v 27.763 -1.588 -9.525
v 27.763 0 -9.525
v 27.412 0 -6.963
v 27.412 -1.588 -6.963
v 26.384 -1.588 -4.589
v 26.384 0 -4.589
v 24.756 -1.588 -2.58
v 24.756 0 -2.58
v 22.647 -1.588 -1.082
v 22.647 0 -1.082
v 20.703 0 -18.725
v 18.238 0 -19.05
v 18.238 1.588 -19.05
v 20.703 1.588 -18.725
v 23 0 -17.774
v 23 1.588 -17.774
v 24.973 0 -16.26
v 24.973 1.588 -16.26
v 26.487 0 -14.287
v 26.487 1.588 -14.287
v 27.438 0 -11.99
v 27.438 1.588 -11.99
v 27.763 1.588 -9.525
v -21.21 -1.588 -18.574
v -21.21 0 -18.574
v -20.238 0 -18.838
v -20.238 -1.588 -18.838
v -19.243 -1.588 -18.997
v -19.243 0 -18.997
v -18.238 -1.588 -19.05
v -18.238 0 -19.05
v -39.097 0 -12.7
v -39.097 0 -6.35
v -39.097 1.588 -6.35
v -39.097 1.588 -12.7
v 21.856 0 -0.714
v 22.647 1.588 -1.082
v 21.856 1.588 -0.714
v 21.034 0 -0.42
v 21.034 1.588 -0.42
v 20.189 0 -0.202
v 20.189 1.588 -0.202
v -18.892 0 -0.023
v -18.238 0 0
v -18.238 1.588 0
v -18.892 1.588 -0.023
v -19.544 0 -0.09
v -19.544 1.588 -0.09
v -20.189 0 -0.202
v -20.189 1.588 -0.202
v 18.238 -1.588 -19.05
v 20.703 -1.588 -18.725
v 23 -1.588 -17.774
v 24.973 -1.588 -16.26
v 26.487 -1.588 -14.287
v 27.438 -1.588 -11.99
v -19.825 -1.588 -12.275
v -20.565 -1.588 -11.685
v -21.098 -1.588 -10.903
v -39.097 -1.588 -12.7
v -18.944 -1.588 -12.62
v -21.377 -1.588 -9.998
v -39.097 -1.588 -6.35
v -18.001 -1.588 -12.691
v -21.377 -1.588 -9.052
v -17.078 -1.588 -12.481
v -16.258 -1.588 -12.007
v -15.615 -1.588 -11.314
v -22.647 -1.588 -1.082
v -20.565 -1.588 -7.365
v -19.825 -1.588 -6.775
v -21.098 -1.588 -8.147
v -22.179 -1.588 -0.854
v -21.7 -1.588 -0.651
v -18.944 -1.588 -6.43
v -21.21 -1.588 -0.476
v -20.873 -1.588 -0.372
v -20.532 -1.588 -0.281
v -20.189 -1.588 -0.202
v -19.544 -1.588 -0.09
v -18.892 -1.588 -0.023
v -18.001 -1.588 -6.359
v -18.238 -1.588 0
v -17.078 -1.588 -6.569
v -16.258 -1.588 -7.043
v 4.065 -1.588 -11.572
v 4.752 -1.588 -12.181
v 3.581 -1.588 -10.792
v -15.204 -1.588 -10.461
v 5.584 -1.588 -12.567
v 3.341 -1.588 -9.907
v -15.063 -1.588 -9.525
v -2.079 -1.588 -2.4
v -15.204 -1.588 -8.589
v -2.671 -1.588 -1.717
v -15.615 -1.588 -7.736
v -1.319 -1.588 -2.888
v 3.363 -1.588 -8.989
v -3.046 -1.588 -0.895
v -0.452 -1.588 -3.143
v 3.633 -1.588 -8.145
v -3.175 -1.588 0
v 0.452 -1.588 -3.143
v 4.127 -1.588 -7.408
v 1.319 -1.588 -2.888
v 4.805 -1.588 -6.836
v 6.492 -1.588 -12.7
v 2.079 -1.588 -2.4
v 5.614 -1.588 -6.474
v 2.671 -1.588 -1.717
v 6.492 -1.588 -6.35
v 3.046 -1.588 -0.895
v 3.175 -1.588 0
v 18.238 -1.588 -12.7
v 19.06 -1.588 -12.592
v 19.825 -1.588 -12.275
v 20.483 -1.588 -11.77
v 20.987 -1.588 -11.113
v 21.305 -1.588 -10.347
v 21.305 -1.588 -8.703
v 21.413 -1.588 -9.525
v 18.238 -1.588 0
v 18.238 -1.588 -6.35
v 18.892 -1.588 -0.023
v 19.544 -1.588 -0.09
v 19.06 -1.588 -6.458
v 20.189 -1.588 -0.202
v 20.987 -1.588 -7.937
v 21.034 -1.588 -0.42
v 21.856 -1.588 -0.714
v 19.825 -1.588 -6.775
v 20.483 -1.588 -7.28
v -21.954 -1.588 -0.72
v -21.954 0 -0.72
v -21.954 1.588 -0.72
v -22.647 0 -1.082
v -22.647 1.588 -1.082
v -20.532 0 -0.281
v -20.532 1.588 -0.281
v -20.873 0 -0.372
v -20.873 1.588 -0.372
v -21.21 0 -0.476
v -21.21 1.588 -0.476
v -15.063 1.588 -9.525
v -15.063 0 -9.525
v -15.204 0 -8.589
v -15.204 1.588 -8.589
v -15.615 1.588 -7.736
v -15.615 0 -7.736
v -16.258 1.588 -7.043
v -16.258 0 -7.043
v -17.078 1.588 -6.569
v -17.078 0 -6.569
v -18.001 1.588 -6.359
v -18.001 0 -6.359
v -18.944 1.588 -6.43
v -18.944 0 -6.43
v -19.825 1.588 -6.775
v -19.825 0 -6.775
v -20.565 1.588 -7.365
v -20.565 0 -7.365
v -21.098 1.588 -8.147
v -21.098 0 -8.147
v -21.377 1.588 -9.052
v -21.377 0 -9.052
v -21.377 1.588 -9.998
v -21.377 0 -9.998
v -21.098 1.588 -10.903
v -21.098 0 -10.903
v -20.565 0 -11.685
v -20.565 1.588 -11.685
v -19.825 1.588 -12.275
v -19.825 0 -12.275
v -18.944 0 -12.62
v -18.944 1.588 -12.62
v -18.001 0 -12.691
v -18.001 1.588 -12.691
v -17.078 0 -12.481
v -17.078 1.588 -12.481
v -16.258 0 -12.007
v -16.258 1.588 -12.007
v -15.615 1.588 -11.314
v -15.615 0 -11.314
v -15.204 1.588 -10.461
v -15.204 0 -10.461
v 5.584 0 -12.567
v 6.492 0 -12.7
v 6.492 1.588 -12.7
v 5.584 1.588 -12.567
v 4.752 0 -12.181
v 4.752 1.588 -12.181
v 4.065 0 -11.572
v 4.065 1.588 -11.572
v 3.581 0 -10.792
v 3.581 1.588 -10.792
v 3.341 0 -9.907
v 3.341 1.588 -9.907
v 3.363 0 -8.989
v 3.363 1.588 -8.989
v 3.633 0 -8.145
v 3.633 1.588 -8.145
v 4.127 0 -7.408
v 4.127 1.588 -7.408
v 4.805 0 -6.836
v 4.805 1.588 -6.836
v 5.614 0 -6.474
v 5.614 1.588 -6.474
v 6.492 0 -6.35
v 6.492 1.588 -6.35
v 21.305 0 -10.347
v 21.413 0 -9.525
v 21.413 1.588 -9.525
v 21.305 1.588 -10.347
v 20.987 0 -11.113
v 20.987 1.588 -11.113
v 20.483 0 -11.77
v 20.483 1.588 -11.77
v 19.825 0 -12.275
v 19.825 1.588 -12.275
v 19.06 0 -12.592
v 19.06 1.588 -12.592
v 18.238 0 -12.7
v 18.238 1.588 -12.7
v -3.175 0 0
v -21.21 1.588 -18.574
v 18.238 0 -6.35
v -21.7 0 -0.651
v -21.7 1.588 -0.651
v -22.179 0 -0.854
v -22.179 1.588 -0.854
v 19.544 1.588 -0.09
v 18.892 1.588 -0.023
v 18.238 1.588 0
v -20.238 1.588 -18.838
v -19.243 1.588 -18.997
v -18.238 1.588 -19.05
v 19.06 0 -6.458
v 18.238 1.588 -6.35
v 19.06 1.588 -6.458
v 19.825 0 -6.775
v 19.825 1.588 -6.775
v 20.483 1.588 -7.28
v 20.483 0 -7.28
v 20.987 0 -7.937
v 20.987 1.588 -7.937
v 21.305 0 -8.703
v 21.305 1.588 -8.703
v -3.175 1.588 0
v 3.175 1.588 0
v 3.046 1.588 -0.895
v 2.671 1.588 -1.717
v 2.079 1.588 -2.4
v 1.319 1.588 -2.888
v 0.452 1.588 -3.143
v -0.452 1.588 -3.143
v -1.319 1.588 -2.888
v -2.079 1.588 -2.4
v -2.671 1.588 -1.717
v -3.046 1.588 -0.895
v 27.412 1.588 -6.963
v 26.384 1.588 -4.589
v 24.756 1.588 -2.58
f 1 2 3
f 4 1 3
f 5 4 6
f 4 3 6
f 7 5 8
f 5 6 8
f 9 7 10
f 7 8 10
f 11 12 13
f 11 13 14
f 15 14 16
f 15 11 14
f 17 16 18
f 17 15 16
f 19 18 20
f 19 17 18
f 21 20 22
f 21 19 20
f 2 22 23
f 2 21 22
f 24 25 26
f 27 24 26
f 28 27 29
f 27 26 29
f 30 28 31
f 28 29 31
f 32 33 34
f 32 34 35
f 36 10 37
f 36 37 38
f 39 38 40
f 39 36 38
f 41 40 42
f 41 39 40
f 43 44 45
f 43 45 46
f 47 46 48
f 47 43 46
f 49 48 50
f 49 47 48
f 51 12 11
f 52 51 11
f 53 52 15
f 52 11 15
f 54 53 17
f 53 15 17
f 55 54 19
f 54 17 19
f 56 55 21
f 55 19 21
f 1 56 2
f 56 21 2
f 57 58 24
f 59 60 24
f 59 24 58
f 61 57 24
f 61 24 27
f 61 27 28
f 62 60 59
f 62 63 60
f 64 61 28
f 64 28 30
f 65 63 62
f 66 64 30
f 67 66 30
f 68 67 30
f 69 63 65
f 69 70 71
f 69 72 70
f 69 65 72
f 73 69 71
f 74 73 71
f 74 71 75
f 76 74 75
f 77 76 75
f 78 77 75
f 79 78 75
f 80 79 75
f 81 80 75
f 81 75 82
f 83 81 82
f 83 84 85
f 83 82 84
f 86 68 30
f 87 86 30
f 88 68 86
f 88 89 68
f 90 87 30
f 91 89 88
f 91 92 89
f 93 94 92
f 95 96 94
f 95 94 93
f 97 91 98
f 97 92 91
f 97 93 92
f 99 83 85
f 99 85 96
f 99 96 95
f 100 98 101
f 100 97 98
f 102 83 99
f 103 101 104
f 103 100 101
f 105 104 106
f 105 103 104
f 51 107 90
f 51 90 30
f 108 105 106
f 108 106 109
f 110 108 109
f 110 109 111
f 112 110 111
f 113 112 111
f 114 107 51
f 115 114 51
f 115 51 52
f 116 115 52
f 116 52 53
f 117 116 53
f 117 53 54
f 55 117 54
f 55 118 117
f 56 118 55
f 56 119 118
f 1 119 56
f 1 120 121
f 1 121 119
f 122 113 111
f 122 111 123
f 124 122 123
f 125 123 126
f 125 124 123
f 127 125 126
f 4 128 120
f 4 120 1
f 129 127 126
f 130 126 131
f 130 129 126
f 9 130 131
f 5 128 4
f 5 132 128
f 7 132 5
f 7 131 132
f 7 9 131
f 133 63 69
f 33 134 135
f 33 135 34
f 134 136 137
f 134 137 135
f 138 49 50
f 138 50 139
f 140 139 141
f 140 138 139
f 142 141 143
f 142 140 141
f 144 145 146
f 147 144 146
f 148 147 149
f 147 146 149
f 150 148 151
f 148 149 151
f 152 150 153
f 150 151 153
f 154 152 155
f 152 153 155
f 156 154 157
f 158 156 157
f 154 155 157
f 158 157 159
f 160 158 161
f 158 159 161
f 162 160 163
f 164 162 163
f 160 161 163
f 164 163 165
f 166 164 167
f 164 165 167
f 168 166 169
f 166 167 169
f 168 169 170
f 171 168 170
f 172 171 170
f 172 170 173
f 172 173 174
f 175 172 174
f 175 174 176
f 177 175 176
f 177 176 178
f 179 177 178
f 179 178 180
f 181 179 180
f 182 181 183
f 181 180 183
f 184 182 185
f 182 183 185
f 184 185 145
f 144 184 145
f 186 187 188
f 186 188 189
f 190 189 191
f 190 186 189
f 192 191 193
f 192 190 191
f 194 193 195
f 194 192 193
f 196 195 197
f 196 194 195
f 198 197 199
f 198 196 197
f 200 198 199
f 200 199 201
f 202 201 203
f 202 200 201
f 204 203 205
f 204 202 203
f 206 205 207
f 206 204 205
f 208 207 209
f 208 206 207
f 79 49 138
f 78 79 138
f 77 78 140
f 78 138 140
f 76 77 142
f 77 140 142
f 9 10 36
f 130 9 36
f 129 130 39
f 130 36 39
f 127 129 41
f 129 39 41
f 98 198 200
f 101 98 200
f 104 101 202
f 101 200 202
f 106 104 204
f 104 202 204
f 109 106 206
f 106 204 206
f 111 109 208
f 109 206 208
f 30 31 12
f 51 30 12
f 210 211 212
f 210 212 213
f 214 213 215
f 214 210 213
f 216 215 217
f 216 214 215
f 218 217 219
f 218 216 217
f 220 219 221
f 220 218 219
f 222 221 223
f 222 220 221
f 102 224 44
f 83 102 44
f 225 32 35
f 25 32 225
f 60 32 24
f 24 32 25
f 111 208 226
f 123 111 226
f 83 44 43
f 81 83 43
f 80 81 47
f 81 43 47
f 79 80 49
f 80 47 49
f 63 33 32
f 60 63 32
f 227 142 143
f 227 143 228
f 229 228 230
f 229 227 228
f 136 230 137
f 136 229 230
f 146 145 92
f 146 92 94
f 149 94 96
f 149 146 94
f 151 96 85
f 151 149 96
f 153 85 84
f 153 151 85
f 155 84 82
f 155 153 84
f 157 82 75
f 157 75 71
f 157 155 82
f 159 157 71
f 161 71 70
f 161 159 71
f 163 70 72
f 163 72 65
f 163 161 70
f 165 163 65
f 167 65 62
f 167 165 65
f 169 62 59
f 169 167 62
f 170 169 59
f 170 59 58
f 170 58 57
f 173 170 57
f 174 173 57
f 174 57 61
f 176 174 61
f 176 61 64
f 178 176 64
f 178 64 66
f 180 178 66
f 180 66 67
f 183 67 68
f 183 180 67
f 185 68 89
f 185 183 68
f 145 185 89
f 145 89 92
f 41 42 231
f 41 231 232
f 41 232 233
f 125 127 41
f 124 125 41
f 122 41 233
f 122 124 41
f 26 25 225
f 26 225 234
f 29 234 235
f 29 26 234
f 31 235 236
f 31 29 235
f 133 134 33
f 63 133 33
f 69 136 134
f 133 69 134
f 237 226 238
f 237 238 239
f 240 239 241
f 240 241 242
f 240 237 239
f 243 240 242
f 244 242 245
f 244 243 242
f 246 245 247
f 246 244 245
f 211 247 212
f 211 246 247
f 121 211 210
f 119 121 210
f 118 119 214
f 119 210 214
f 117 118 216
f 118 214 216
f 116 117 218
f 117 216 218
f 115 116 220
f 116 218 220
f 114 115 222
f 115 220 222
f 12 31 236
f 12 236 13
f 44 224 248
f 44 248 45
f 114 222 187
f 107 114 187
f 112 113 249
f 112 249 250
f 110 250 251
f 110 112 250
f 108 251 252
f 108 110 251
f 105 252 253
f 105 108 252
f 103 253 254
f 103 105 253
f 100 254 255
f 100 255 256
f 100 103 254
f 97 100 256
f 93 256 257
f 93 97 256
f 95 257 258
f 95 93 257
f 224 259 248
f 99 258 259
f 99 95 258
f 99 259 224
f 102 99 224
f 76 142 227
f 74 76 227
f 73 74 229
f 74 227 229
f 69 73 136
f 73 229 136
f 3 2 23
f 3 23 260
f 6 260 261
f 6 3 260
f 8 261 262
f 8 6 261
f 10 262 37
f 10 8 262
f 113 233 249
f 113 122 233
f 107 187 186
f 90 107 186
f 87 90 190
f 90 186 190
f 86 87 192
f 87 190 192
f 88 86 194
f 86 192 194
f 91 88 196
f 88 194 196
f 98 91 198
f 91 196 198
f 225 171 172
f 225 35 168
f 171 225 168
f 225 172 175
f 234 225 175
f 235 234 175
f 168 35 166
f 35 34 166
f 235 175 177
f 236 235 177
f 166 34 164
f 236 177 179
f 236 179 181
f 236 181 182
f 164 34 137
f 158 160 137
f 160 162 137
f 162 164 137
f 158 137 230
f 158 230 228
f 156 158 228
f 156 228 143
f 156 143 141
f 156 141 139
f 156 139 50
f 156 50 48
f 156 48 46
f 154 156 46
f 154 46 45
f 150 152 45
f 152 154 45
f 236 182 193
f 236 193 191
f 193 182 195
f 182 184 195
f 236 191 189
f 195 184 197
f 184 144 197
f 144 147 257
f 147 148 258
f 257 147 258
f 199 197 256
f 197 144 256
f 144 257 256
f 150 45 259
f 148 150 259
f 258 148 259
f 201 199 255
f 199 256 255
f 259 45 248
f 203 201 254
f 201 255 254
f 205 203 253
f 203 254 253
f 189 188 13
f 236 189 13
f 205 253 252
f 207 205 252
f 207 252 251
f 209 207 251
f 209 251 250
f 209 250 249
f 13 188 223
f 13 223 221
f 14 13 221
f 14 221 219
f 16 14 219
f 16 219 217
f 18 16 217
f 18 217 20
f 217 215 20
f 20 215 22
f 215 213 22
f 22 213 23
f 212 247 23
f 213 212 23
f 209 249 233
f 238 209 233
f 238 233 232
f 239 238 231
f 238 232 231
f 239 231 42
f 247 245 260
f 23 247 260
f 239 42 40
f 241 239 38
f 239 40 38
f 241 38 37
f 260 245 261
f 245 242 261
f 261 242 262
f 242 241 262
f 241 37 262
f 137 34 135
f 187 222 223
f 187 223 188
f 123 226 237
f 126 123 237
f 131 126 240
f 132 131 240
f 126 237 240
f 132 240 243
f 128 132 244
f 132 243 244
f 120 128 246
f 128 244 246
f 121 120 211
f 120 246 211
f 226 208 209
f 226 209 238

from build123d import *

# Parameters (mm, degrees)
F0_R     = 3.175
F1_DEPTH = 1.5875


with BuildPart() as f1:
    # F0 (on Front) → F1 (new body, symmetric)
    with BuildSketch(Plane.XZ):
        with BuildLine():
            Line((18.2378478348, 0), (3.175, 0))
            ThreePointArc((3.175, 0), (0, -3.175), (-3.175, 0))
            Line((-3.175, 0), (-18.2378478348, 0))
            ThreePointArc((-18.2378478348, 0), (-12.9826090881, -1.5809399099), (-9.4718777788, -5.7989573302))
            Line((-9.4718777788, -5.7989573302), (0, -10.7457929799))
            Line((0, -10.7457929799), (3.3629814094, -8.9894235763))
            ThreePointArc((3.3629814094, -8.9894235763), (4.4455137358, -7.0979565161), (6.4924834296, -6.35))
            Line((6.4924834296, -6.35), (8.4167772684, -6.35))
            Line((8.4167772684, -6.35), (9.4718777788, -5.7989573302))
            ThreePointArc((9.4718777788, -5.7989573302), (12.9826090881, -1.5809399099), (18.2378478348, 0))
        make_face()
        with BuildLine():
            ThreePointArc((20.1887122983, -0.2019236384), (19.2184911582, -0.0506153935), (18.2378478348, 0))
            ThreePointArc((18.2378478348, 0), (12.9826090881, -1.5809399099), (9.4718777788, -5.7989573302))
            Line((9.4718777788, -5.7989573302), (20.1887122983, -0.2019236384))
        make_face()
        with BuildLine():
            ThreePointArc((-9.4718777788, -5.7989573302), (-12.9826090881, -1.5809399099), (-18.2378478348, 0))
            ThreePointArc((-18.2378478348, 0), (-19.2184911582, -0.0506153935), (-20.1887122983, -0.2019236384))
            Line((-20.1887122983, -0.2019236384), (-9.4718777788, -5.7989573302))
        make_face()
        with BuildLine():
            ThreePointArc((22.6472823333, -1.082102843), (21.4483041232, -0.5573584248), (20.1887122983, -0.2019236384))
            Line((20.1887122983, -0.2019236384), (9.4718777788, -5.7989573302))
            ThreePointArc((9.4718777788, -5.7989573302), (9.3604581347, -6.0728156028), (9.2575917138, -6.35))
            Line((9.2575917138, -6.35), (18.2378478348, -6.35))
            ThreePointArc((18.2378478348, -6.35), (20.4829118651, -7.2799359697), (21.4128478348, -9.525))
            ThreePointArc((21.4128478348, -9.525), (20.4829118651, -11.7700640303), (18.2378478348, -12.7))
            Line((18.2378478348, -12.7), (9.2575917138, -12.7))
            ThreePointArc((9.2575917138, -12.7), (11.0435001343, -15.7673542165), (13.8284133364, -17.967897157))
            ThreePointArc((13.8284133364, -17.967897157), (15.9677124226, -18.7755194562), (18.2378478348, -19.05))
            ThreePointArc((18.2378478348, -19.05), (24.9730399256, -16.2601920908), (27.7628478348, -9.525))
            ThreePointArc((27.7628478348, -9.525), (26.384181016, -4.5891231072), (22.6472823333, -1.082102843))
        make_face()
        with BuildLine():
            ThreePointArc((9.2575917138, -6.35), (9.3604581347, -6.0728156028), (9.4718777788, -5.7989573302))
            Line((9.4718777788, -5.7989573302), (8.4167772684, -6.35))
            Line((8.4167772684, -6.35), (9.2575917138, -6.35))
        make_face()
        with BuildLine():
            Line((0, -10.7457929799), (-9.4718777788, -5.7989573302))
            ThreePointArc((-9.4718777788, -5.7989573302), (-8.9045341204, -7.6237161947), (-8.7128478348, -9.525))
            ThreePointArc((-8.7128478348, -9.525), (-10.0915146536, -14.4608768928), (-13.8284133364, -17.967897157))
            Line((-13.8284133364, -17.967897157), (0, -10.7457929799))
        make_face()
        with BuildLine():
            ThreePointArc((-8.7128478348, -9.525), (-8.9045341204, -7.6237161947), (-9.4718777788, -5.7989573302))
            Line((-9.4718777788, -5.7989573302), (-20.1887122983, -0.2019236384))
            ThreePointArc((-20.1887122983, -0.2019236384), (-20.7031117187, -0.3245598484), (-21.2099123798, -0.4755548601))
            ThreePointArc((-21.2099123798, -0.4755548601), (-21.9410366156, -0.7493508585), (-22.6472823333, -1.082102843))
            ThreePointArc((-22.6472823333, -1.082102843), (-27.7308527221, -10.3050533377), (-21.2099123798, -18.5744451399))
            ThreePointArc((-21.2099123798, -18.5744451399), (-19.7427830564, -18.9303599069), (-18.2378478348, -19.05))
            ThreePointArc((-18.2378478348, -19.05), (-15.9677124226, -18.7755194562), (-13.8284133364, -17.967897157))
            ThreePointArc((-13.8284133364, -17.967897157), (-10.0915146536, -14.4608768928), (-8.7128478348, -9.525))
        make_face()
        with Locations((-18.2378478348, -9.525)):
            Circle(F0_R, mode=Mode.SUBTRACT)
        with BuildLine():
            Line((13.8284133364, -17.967897157), (0, -10.7457929799))
            Line((0, -10.7457929799), (-13.8284133364, -17.967897157))
            ThreePointArc((-13.8284133364, -17.967897157), (-15.9677124226, -18.7755194562), (-18.2378478348, -19.05))
            Line((-18.2378478348, -19.05), (18.2378478348, -19.05))
            ThreePointArc((18.2378478348, -19.05), (15.9677124226, -18.7755194562), (13.8284133364, -17.967897157))
        make_face()
        with BuildLine():
            Line((3.3629814094, -8.9894235763), (0, -10.7457929799))
            Line((0, -10.7457929799), (13.8284133364, -17.967897157))
            ThreePointArc((13.8284133364, -17.967897157), (11.0435001343, -15.7673542165), (9.2575917138, -12.7))
            Line((9.2575917138, -12.7), (6.4924834296, -12.7))
            ThreePointArc((6.4924834296, -12.7), (4.0654399457, -11.5719696938), (3.3629814094, -8.9894235763))
        make_face()
        with BuildLine():
            Line((-22.6472823333, -1.082102843), (-21.9535177998, -0.7197735133))
            Line((-21.9535177998, -0.7197735133), (-39.097144814, -6.3501702098))
            Line((-39.097144814, -6.3501702098), (-39.097144814, -12.6998297902))
            Line((-39.097144814, -12.6998297902), (-21.2099123798, -18.5744451399))
            ThreePointArc((-21.2099123798, -18.5744451399), (-27.7308527221, -10.3050533377), (-22.6472823333, -1.082102843))
        make_face()
    extrude(amount=F1_DEPTH, both=True)


solid = f1.part
